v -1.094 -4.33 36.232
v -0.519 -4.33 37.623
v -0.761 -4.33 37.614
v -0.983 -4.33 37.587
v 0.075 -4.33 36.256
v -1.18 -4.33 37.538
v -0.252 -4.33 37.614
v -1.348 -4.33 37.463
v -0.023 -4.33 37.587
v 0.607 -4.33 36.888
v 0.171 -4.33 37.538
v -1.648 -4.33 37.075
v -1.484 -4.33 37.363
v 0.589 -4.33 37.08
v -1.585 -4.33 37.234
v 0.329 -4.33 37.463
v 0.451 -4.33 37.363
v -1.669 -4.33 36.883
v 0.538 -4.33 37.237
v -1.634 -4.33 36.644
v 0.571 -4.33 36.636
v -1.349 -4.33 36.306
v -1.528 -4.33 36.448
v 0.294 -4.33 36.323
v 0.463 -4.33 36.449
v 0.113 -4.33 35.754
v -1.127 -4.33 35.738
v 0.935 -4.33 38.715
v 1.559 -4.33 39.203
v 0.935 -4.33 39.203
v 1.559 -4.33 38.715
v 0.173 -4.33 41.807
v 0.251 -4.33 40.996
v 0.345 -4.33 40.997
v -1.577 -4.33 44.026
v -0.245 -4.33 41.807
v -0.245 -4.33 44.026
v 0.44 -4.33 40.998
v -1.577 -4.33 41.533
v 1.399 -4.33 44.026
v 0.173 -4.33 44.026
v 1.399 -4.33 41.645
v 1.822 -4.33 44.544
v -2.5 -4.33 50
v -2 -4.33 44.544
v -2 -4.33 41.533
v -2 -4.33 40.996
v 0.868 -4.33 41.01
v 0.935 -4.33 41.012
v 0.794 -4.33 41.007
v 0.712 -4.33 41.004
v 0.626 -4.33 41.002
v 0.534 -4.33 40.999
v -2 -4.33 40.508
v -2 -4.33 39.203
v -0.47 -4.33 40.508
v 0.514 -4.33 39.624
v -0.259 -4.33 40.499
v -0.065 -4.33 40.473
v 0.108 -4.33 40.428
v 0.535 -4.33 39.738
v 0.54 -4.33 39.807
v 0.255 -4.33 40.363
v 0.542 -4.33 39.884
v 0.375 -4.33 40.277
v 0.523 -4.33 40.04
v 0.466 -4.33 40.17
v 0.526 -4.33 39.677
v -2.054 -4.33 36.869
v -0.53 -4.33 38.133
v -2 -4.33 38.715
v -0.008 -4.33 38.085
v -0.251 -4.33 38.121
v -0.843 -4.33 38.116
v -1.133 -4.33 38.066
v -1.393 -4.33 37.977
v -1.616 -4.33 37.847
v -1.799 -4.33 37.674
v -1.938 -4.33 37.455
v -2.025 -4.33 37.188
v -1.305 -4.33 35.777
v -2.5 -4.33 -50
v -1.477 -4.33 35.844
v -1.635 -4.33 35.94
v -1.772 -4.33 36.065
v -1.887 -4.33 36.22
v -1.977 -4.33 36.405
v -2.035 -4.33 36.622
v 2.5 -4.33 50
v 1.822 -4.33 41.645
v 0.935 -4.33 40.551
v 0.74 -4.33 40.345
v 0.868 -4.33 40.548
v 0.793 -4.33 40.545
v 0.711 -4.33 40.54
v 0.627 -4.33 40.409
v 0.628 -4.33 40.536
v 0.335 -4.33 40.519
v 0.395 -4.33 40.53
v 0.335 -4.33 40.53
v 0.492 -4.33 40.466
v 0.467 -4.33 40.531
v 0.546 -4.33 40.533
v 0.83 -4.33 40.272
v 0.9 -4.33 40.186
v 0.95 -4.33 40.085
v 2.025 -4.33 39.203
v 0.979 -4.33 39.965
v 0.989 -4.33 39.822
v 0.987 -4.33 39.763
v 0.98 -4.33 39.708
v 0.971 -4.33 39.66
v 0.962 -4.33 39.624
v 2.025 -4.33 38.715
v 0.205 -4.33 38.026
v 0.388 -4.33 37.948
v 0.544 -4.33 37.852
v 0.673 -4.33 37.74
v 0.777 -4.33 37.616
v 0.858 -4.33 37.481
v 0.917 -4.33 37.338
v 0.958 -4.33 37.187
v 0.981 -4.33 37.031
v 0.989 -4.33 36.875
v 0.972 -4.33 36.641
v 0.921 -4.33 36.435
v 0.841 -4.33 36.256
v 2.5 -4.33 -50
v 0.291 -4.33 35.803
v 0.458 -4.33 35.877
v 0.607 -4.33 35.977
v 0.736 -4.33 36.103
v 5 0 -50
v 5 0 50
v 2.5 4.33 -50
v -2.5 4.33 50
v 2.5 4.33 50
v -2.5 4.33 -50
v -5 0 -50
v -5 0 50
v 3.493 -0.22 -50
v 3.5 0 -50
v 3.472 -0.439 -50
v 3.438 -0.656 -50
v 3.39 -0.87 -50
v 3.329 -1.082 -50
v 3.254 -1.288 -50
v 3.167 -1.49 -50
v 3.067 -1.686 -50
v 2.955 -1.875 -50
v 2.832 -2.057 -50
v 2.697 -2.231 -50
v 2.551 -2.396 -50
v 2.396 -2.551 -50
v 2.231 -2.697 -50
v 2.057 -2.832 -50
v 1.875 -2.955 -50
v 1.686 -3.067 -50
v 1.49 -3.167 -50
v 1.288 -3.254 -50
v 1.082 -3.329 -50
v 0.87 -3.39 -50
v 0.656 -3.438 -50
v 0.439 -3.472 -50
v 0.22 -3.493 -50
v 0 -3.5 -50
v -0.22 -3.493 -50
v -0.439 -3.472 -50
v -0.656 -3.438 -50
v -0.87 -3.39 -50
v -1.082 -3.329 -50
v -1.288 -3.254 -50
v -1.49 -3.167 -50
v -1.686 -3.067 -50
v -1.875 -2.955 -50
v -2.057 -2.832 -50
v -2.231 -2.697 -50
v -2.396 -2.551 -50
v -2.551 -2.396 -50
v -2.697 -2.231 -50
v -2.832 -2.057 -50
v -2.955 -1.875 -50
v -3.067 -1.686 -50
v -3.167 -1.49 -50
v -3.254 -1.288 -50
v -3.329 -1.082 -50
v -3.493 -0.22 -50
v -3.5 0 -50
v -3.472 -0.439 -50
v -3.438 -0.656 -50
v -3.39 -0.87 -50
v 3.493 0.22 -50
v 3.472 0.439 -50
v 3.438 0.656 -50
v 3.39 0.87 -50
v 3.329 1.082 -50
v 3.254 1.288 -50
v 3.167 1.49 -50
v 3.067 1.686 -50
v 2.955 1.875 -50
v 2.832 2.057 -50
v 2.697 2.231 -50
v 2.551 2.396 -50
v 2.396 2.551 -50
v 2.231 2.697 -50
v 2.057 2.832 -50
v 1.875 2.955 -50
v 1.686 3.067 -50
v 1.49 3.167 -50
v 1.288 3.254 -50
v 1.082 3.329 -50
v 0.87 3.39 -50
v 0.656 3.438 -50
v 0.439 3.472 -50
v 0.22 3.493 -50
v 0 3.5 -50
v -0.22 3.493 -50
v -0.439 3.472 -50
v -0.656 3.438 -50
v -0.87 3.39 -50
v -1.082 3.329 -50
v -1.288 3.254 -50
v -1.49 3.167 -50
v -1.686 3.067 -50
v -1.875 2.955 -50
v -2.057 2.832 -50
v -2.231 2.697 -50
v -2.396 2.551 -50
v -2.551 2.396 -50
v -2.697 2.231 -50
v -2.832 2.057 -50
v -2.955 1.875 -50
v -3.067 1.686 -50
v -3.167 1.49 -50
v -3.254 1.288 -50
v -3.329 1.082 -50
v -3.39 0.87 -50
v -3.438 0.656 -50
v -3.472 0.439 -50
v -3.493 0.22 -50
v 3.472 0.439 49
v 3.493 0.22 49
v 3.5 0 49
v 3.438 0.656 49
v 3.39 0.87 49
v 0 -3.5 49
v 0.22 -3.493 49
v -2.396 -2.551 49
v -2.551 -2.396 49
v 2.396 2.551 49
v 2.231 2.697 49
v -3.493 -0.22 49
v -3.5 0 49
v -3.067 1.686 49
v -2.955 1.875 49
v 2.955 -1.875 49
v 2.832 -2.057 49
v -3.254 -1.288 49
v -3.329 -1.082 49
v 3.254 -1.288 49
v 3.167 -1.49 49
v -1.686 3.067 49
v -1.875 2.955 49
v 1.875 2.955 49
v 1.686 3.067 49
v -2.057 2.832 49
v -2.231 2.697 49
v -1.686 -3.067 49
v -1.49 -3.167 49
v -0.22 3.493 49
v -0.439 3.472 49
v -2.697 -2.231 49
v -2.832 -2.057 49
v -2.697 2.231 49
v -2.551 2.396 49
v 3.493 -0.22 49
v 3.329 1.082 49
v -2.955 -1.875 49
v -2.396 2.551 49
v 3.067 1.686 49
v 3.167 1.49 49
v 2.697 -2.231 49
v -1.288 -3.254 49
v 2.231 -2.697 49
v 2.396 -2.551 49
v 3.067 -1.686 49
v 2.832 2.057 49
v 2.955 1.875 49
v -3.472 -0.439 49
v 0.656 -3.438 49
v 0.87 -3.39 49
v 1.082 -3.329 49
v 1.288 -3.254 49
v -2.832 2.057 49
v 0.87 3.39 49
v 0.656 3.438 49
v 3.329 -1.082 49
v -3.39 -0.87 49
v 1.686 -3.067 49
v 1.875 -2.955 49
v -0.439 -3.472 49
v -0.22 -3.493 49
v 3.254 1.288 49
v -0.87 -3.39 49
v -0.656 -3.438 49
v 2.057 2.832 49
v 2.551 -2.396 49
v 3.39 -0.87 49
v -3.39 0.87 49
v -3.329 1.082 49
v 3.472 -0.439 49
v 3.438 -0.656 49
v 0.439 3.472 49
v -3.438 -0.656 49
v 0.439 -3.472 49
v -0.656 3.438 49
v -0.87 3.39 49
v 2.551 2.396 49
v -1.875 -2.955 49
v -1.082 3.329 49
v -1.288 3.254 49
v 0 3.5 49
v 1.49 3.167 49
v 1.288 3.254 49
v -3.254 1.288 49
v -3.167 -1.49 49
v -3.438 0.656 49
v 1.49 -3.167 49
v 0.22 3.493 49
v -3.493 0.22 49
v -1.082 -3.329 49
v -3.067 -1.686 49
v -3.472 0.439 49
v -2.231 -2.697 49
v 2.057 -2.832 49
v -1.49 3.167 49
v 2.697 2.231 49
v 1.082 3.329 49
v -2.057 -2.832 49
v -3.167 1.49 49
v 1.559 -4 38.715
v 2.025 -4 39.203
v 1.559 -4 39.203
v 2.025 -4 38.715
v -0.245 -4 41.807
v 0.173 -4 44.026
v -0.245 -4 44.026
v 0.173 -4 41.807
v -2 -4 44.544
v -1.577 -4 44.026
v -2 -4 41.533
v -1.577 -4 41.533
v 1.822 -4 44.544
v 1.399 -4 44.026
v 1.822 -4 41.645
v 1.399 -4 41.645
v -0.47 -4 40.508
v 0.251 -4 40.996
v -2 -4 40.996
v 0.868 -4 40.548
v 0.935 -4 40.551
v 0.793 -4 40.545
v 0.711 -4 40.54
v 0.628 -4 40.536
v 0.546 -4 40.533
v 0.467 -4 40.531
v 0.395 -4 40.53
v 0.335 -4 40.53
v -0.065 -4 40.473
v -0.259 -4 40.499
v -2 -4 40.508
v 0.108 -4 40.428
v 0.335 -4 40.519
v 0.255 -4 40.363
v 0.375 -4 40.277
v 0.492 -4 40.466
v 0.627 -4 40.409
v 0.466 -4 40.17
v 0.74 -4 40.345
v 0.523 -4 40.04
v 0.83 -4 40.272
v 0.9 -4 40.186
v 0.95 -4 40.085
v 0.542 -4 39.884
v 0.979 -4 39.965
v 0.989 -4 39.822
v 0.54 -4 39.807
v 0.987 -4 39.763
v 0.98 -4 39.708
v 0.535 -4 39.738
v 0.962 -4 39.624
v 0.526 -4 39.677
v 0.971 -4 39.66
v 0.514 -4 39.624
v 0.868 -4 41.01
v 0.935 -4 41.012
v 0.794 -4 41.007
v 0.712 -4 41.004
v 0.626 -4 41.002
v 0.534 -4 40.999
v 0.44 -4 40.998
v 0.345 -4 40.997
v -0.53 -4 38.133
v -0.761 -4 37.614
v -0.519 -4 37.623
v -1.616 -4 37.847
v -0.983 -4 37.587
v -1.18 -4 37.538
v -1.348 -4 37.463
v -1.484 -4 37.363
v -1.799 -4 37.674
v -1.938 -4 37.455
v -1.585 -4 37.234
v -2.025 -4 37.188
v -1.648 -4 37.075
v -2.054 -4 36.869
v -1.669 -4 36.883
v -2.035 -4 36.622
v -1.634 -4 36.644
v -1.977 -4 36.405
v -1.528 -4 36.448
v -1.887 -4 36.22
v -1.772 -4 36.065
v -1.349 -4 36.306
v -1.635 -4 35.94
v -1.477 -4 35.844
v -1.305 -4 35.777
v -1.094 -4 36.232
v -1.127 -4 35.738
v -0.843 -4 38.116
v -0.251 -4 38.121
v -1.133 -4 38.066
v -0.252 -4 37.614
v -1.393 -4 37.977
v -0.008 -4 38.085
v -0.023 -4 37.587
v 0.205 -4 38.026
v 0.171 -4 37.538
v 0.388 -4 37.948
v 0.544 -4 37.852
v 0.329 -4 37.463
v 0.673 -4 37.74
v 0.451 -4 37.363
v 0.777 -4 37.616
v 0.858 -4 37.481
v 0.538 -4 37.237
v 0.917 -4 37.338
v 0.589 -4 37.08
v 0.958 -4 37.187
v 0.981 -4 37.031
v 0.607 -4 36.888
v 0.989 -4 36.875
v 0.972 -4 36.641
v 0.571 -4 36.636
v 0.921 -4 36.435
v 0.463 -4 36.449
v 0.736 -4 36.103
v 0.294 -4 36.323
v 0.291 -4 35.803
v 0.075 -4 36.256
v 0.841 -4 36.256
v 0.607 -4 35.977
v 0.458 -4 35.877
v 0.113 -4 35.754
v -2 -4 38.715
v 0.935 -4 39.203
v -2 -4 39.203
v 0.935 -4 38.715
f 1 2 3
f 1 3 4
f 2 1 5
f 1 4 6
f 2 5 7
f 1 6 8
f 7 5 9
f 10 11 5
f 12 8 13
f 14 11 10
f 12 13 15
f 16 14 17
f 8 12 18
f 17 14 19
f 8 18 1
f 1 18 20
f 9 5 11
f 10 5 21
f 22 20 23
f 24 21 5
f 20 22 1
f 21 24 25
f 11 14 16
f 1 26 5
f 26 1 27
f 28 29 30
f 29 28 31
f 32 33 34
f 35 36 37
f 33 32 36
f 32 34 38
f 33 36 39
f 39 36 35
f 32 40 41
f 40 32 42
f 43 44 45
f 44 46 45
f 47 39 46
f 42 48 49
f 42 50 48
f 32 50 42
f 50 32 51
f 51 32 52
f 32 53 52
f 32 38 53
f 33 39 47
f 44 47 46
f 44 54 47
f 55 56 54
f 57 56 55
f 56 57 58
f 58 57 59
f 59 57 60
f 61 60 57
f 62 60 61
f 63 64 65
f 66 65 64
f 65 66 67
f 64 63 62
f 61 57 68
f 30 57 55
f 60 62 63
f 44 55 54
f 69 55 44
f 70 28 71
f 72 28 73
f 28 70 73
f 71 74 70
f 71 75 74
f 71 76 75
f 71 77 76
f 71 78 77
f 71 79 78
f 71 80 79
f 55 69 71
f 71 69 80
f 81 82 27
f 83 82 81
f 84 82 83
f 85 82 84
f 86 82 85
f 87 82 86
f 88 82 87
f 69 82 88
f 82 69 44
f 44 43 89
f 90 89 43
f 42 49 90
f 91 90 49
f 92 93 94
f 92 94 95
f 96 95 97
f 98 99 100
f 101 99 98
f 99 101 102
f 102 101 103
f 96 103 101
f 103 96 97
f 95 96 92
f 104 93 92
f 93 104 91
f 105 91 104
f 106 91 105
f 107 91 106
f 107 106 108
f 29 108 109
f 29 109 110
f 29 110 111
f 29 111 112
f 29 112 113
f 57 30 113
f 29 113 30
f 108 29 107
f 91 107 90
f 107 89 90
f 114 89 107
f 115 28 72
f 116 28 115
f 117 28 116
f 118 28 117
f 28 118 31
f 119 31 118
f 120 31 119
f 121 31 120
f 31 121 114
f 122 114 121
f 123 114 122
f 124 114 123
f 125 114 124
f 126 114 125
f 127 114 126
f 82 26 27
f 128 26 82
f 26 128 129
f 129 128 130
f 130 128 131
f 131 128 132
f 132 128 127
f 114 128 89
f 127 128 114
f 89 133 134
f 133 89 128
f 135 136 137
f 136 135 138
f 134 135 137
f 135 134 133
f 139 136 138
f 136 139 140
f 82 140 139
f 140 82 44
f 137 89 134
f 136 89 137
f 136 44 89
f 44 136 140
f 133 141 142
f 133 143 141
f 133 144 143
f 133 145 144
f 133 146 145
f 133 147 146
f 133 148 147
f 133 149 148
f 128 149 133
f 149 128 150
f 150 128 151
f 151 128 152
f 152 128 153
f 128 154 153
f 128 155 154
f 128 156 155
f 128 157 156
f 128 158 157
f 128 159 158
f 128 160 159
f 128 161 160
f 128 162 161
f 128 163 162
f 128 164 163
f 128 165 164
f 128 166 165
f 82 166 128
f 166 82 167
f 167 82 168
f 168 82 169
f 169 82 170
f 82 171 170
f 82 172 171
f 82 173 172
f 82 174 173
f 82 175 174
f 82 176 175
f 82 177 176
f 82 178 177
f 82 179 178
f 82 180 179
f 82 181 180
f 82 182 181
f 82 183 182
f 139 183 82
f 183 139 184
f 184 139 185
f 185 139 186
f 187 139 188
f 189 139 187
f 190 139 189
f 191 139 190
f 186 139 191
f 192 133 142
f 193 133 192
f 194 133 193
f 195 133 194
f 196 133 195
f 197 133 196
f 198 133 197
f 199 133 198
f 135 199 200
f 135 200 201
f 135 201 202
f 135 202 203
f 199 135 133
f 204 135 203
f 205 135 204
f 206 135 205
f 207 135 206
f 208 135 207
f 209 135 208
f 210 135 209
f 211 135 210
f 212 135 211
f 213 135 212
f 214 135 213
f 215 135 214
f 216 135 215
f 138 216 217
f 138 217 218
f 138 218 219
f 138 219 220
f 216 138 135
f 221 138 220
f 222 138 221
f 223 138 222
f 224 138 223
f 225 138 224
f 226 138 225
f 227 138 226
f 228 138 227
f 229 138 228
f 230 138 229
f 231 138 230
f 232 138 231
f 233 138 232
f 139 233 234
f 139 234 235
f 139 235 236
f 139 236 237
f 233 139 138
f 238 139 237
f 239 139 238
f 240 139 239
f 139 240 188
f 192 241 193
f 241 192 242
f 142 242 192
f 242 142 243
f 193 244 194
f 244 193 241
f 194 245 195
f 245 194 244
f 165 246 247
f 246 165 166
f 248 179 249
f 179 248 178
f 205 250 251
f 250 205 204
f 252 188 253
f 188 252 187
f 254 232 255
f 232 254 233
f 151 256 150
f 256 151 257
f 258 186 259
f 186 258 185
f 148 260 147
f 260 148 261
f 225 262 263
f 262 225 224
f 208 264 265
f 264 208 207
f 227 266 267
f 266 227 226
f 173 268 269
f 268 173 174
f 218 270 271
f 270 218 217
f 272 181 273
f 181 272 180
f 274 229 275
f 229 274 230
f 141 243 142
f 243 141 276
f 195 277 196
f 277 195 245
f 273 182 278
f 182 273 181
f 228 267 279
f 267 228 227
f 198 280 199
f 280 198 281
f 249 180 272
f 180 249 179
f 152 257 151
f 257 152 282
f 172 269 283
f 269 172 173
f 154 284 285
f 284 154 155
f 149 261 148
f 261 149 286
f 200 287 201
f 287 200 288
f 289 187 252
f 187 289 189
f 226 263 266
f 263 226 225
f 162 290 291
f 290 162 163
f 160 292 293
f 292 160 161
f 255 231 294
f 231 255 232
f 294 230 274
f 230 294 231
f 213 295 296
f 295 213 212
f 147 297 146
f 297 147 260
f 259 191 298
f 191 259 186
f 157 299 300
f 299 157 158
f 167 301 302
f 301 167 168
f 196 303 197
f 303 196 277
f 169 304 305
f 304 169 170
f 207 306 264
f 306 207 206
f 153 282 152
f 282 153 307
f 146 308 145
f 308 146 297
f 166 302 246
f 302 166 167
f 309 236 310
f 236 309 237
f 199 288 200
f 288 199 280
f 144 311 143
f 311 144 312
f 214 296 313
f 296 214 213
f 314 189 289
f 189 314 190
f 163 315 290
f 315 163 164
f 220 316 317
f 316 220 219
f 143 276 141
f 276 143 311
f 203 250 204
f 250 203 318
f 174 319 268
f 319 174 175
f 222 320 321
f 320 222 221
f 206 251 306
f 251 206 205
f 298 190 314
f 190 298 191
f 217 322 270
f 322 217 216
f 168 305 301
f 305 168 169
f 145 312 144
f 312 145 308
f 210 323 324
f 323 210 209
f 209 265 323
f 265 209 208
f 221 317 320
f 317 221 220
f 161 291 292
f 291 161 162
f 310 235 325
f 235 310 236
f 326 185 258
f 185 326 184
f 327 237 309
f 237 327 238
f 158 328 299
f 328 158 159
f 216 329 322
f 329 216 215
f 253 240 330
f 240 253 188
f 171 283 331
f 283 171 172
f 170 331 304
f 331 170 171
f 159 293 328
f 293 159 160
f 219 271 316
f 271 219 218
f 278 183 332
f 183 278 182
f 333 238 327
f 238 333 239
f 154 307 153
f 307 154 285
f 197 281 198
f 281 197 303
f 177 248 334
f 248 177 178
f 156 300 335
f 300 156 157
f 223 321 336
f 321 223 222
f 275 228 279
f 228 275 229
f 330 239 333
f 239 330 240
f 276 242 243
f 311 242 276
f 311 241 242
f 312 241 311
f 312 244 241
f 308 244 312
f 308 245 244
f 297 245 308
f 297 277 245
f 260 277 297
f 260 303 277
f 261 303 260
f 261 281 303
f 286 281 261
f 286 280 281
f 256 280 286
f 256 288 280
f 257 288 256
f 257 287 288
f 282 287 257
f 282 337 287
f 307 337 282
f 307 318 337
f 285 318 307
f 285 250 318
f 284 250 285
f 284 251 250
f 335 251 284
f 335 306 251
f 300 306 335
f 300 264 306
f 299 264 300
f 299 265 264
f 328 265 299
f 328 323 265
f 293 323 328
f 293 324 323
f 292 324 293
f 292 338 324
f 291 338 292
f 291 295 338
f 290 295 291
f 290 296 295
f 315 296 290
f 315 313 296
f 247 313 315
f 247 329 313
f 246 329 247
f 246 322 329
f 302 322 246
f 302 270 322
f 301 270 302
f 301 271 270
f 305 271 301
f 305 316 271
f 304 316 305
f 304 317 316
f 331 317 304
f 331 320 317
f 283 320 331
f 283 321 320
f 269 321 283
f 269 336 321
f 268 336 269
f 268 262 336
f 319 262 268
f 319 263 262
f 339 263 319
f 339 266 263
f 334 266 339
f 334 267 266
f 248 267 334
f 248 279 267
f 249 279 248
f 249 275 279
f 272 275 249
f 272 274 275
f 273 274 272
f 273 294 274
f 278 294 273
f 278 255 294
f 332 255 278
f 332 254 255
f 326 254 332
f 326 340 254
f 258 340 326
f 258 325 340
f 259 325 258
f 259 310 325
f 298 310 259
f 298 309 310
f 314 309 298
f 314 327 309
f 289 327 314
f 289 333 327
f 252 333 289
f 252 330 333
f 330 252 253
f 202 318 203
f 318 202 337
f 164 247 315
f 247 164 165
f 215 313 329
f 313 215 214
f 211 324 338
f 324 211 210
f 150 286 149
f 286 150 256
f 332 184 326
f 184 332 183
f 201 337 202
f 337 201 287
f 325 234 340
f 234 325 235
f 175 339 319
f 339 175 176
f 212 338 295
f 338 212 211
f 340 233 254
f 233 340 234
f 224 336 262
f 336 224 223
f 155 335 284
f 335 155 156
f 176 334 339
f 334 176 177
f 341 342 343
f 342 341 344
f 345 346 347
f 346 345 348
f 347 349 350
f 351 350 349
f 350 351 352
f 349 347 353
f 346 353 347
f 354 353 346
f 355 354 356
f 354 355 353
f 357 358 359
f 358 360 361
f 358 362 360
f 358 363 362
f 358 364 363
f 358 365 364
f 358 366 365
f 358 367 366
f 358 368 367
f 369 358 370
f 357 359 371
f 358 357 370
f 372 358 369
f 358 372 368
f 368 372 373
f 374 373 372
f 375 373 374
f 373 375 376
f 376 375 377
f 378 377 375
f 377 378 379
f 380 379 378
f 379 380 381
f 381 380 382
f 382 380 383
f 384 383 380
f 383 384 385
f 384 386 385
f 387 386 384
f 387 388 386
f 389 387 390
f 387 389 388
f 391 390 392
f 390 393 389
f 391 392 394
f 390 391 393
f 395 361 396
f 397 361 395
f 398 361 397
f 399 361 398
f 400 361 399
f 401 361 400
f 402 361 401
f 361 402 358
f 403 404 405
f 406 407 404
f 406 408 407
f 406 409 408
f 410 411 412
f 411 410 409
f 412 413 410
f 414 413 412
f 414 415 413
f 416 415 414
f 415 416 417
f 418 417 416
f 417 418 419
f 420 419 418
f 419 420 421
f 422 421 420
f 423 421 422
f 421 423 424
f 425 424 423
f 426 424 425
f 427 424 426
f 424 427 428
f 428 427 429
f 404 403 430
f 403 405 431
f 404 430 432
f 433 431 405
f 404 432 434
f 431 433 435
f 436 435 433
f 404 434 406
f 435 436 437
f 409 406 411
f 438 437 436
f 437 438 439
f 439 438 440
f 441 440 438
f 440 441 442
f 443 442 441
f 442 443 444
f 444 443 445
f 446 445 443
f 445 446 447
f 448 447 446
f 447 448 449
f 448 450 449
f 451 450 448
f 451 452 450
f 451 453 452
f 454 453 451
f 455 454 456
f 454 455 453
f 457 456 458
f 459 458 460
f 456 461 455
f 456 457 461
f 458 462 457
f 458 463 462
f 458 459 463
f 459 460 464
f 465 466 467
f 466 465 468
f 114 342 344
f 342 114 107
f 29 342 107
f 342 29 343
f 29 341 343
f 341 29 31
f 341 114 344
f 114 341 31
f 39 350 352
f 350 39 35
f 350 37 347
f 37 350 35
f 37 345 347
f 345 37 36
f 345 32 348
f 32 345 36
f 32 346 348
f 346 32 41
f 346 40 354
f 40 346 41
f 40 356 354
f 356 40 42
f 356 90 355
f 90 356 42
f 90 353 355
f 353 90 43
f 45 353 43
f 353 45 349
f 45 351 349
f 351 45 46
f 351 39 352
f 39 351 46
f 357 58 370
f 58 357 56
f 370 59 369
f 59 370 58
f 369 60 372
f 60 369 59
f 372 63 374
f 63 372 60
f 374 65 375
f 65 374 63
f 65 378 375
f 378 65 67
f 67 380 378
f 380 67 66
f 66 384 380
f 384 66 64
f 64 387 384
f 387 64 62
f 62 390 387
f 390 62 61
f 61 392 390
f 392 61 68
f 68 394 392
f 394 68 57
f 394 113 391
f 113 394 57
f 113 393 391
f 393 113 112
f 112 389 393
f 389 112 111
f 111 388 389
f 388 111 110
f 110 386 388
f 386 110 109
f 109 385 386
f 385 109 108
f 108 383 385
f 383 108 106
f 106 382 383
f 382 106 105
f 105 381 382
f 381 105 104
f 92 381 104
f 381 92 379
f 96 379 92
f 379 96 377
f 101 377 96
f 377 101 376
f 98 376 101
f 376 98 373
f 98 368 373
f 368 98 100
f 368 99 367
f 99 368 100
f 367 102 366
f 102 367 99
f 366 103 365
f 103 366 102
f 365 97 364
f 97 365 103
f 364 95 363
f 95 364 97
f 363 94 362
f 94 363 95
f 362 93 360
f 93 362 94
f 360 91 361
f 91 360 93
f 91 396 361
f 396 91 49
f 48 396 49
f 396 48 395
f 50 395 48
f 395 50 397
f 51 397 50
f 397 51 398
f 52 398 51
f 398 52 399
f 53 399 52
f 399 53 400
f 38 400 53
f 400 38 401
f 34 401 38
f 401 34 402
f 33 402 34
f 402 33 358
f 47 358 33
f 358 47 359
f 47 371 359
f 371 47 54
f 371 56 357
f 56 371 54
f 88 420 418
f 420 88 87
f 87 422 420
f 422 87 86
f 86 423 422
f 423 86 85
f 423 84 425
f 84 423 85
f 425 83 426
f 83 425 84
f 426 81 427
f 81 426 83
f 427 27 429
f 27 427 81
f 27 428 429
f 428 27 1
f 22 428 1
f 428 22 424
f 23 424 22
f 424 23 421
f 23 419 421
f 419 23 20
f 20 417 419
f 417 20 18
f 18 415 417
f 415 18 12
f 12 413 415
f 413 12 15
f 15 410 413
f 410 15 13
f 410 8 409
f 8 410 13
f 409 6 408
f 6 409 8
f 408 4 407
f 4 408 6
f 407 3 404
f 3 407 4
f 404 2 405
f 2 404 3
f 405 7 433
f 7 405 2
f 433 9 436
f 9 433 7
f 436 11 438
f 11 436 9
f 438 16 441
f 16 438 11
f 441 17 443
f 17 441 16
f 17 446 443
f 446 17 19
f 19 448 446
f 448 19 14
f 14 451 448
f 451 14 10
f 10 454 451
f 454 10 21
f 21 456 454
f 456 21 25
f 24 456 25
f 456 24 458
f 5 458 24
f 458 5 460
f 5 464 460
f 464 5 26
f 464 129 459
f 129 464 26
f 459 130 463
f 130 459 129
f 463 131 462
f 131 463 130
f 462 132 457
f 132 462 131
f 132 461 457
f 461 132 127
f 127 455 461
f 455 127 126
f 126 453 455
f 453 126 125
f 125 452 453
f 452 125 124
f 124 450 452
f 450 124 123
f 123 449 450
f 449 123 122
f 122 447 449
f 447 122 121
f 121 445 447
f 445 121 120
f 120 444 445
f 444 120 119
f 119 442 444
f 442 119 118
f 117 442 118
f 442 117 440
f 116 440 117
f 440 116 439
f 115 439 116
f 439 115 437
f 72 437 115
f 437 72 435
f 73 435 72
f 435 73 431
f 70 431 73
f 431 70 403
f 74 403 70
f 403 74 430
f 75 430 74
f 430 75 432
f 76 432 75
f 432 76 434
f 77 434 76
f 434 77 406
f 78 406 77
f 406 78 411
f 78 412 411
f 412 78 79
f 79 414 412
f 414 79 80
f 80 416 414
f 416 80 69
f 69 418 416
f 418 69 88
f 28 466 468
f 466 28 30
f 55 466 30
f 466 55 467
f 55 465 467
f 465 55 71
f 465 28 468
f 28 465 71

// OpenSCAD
font1 = "Liberation Sans";
content = "Eric";

difference() {
    cylinder(h = 100, d= 10, center = true, $fn=6);
    
    translate([0,0,-1]) cylinder(h = 100, d = 7, center = true, $fn=100);
    translate ([-2,-4,45]) { rotate ([0,90,-90]) {
        linear_extrude(height = 2) {
            text(content, font = font1, size = 4, direction = "ltr", spacing = 1 );
    }}}
}
